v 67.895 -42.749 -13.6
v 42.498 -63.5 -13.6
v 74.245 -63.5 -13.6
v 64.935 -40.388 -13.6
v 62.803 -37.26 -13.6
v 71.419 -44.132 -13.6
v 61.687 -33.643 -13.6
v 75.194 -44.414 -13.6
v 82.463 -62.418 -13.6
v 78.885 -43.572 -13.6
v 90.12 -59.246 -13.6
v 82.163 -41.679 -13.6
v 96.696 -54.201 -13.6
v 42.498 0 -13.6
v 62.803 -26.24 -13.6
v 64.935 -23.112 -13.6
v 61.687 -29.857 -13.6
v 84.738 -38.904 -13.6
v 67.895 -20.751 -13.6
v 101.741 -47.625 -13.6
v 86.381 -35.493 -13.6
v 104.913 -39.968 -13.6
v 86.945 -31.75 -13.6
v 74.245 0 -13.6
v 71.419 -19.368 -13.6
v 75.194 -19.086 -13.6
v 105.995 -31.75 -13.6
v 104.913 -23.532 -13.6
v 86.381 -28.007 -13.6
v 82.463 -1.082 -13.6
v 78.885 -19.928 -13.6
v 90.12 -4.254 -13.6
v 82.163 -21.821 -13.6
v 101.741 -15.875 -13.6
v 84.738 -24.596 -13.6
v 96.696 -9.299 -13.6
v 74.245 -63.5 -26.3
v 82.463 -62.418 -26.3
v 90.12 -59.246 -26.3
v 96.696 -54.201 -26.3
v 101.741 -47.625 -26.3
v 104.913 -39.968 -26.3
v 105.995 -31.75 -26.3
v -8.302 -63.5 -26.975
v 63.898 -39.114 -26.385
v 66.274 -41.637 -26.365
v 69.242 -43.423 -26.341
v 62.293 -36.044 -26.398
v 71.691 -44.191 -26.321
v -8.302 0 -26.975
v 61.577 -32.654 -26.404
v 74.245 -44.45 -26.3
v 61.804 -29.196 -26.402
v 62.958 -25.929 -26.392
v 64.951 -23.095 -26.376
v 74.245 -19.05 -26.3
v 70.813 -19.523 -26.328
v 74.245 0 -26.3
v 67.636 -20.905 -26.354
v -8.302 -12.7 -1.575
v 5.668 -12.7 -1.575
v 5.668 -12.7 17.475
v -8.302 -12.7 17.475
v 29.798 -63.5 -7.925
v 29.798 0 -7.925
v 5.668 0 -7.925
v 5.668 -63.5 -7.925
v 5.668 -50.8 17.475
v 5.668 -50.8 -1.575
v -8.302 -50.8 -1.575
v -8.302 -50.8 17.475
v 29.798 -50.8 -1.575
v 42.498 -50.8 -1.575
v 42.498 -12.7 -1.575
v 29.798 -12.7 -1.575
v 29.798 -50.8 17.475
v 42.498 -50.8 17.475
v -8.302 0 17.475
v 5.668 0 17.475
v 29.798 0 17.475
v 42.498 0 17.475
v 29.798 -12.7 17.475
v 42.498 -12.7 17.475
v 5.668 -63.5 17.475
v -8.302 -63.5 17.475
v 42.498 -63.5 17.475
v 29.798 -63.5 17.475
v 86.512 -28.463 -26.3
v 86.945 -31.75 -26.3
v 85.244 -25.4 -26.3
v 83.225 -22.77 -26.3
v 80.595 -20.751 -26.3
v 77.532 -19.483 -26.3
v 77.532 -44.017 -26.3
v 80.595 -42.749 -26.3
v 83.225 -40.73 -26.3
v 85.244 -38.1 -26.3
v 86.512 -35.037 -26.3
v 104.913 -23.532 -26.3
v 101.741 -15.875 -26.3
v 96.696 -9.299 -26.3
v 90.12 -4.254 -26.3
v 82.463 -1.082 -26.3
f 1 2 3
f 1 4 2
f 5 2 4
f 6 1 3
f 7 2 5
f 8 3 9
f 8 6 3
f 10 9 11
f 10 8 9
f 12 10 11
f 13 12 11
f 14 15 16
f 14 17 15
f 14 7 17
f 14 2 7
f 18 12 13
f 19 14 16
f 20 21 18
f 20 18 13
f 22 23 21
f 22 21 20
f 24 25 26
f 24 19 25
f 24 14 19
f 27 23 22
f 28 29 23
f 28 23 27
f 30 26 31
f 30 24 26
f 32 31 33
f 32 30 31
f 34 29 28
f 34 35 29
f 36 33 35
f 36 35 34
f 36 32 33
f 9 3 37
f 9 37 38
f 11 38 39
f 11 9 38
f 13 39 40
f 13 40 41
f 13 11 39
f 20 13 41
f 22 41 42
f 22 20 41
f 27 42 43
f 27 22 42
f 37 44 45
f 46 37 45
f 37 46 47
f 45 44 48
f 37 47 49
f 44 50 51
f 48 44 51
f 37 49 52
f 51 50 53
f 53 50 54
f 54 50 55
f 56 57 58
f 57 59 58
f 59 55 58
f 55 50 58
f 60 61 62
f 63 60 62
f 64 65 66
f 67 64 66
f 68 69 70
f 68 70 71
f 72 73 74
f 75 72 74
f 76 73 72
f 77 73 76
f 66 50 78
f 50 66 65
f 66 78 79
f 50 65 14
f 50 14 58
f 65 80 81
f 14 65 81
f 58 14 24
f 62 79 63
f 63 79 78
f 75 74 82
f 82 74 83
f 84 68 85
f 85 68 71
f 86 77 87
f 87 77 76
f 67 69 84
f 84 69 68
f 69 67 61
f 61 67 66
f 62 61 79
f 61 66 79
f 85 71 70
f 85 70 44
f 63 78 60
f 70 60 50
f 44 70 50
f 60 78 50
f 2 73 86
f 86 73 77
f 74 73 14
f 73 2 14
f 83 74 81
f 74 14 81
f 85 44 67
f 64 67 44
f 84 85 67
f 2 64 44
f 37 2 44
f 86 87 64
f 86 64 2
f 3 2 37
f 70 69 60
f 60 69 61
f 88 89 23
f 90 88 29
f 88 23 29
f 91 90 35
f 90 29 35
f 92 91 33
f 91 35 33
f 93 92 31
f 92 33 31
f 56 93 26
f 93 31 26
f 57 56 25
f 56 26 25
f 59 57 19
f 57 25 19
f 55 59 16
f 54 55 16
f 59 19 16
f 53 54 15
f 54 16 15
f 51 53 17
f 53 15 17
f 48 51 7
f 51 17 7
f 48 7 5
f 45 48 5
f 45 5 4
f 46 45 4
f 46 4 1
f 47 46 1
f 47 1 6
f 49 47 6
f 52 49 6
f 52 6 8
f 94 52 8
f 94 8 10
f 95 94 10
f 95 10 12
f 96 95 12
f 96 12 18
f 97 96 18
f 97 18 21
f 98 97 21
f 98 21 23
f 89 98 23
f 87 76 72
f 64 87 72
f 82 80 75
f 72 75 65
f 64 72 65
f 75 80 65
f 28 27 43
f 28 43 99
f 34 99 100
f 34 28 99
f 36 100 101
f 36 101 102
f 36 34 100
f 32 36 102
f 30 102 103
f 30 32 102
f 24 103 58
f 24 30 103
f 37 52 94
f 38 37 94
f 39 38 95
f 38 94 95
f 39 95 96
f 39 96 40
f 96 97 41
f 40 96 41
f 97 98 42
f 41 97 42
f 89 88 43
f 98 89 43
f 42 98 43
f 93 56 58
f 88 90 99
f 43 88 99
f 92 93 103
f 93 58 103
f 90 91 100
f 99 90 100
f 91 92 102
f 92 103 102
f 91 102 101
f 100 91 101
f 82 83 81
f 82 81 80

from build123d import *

# Parameters (mm, degrees)
F1_DEPTH = 63.5
F3_DEPTH = 12.7
F4_R     = 12.7
F6_DEPTH = 25.4
F5_W     = 38.1
F5_H     = 19.05
F7_DEPTH = 50.801


with BuildPart() as f1:
    # F0 (on Front) → F1 (new body)
    with BuildSketch(Plane.XZ):
        Polygon((5.667796, 17.475092), (-8.302204, 17.475092), (-8.302204, -26.974908), (74.245038, -26.300137), (74.245038, -13.600137), (42.497796, -13.600137), (42.497796, 17.475092), (29.797796, 17.475092), (29.797796, -7.924908), (5.667796, -7.924908), align=None)
    extrude(amount=F1_DEPTH)

    # F2 (on face) → F3 (join)
    with BuildSketch(Plane.XY.offset(-13.600137)):
        with BuildLine():
            ThreePointArc((74.245038, -63.5), (96.695679, -54.20064), (105.995038, -31.75))
            ThreePointArc((105.995038, -31.75), (96.695679, -9.29936), (74.245038, 0))
            Line((74.245038, 0), (74.245038, -63.5))
        make_face()
    extrude(amount=-F3_DEPTH)

    # F4 (on face) → F6 (cut)
    with BuildSketch(Plane.XY.offset(-13.600137)):
        with Locations((74.245038, -31.75)):
            Circle(F4_R)
    extrude(amount=-F6_DEPTH, mode=Mode.SUBTRACT)

    # F5 (on face) → F7 (cut, through all)
    with BuildSketch(Plane.YZ.offset(42.497796)):
        with Locations((-31.75, 7.950092)):
            Rectangle(F5_W, F5_H)
    extrude(amount=-F7_DEPTH, mode=Mode.SUBTRACT)


solid = f1.part
